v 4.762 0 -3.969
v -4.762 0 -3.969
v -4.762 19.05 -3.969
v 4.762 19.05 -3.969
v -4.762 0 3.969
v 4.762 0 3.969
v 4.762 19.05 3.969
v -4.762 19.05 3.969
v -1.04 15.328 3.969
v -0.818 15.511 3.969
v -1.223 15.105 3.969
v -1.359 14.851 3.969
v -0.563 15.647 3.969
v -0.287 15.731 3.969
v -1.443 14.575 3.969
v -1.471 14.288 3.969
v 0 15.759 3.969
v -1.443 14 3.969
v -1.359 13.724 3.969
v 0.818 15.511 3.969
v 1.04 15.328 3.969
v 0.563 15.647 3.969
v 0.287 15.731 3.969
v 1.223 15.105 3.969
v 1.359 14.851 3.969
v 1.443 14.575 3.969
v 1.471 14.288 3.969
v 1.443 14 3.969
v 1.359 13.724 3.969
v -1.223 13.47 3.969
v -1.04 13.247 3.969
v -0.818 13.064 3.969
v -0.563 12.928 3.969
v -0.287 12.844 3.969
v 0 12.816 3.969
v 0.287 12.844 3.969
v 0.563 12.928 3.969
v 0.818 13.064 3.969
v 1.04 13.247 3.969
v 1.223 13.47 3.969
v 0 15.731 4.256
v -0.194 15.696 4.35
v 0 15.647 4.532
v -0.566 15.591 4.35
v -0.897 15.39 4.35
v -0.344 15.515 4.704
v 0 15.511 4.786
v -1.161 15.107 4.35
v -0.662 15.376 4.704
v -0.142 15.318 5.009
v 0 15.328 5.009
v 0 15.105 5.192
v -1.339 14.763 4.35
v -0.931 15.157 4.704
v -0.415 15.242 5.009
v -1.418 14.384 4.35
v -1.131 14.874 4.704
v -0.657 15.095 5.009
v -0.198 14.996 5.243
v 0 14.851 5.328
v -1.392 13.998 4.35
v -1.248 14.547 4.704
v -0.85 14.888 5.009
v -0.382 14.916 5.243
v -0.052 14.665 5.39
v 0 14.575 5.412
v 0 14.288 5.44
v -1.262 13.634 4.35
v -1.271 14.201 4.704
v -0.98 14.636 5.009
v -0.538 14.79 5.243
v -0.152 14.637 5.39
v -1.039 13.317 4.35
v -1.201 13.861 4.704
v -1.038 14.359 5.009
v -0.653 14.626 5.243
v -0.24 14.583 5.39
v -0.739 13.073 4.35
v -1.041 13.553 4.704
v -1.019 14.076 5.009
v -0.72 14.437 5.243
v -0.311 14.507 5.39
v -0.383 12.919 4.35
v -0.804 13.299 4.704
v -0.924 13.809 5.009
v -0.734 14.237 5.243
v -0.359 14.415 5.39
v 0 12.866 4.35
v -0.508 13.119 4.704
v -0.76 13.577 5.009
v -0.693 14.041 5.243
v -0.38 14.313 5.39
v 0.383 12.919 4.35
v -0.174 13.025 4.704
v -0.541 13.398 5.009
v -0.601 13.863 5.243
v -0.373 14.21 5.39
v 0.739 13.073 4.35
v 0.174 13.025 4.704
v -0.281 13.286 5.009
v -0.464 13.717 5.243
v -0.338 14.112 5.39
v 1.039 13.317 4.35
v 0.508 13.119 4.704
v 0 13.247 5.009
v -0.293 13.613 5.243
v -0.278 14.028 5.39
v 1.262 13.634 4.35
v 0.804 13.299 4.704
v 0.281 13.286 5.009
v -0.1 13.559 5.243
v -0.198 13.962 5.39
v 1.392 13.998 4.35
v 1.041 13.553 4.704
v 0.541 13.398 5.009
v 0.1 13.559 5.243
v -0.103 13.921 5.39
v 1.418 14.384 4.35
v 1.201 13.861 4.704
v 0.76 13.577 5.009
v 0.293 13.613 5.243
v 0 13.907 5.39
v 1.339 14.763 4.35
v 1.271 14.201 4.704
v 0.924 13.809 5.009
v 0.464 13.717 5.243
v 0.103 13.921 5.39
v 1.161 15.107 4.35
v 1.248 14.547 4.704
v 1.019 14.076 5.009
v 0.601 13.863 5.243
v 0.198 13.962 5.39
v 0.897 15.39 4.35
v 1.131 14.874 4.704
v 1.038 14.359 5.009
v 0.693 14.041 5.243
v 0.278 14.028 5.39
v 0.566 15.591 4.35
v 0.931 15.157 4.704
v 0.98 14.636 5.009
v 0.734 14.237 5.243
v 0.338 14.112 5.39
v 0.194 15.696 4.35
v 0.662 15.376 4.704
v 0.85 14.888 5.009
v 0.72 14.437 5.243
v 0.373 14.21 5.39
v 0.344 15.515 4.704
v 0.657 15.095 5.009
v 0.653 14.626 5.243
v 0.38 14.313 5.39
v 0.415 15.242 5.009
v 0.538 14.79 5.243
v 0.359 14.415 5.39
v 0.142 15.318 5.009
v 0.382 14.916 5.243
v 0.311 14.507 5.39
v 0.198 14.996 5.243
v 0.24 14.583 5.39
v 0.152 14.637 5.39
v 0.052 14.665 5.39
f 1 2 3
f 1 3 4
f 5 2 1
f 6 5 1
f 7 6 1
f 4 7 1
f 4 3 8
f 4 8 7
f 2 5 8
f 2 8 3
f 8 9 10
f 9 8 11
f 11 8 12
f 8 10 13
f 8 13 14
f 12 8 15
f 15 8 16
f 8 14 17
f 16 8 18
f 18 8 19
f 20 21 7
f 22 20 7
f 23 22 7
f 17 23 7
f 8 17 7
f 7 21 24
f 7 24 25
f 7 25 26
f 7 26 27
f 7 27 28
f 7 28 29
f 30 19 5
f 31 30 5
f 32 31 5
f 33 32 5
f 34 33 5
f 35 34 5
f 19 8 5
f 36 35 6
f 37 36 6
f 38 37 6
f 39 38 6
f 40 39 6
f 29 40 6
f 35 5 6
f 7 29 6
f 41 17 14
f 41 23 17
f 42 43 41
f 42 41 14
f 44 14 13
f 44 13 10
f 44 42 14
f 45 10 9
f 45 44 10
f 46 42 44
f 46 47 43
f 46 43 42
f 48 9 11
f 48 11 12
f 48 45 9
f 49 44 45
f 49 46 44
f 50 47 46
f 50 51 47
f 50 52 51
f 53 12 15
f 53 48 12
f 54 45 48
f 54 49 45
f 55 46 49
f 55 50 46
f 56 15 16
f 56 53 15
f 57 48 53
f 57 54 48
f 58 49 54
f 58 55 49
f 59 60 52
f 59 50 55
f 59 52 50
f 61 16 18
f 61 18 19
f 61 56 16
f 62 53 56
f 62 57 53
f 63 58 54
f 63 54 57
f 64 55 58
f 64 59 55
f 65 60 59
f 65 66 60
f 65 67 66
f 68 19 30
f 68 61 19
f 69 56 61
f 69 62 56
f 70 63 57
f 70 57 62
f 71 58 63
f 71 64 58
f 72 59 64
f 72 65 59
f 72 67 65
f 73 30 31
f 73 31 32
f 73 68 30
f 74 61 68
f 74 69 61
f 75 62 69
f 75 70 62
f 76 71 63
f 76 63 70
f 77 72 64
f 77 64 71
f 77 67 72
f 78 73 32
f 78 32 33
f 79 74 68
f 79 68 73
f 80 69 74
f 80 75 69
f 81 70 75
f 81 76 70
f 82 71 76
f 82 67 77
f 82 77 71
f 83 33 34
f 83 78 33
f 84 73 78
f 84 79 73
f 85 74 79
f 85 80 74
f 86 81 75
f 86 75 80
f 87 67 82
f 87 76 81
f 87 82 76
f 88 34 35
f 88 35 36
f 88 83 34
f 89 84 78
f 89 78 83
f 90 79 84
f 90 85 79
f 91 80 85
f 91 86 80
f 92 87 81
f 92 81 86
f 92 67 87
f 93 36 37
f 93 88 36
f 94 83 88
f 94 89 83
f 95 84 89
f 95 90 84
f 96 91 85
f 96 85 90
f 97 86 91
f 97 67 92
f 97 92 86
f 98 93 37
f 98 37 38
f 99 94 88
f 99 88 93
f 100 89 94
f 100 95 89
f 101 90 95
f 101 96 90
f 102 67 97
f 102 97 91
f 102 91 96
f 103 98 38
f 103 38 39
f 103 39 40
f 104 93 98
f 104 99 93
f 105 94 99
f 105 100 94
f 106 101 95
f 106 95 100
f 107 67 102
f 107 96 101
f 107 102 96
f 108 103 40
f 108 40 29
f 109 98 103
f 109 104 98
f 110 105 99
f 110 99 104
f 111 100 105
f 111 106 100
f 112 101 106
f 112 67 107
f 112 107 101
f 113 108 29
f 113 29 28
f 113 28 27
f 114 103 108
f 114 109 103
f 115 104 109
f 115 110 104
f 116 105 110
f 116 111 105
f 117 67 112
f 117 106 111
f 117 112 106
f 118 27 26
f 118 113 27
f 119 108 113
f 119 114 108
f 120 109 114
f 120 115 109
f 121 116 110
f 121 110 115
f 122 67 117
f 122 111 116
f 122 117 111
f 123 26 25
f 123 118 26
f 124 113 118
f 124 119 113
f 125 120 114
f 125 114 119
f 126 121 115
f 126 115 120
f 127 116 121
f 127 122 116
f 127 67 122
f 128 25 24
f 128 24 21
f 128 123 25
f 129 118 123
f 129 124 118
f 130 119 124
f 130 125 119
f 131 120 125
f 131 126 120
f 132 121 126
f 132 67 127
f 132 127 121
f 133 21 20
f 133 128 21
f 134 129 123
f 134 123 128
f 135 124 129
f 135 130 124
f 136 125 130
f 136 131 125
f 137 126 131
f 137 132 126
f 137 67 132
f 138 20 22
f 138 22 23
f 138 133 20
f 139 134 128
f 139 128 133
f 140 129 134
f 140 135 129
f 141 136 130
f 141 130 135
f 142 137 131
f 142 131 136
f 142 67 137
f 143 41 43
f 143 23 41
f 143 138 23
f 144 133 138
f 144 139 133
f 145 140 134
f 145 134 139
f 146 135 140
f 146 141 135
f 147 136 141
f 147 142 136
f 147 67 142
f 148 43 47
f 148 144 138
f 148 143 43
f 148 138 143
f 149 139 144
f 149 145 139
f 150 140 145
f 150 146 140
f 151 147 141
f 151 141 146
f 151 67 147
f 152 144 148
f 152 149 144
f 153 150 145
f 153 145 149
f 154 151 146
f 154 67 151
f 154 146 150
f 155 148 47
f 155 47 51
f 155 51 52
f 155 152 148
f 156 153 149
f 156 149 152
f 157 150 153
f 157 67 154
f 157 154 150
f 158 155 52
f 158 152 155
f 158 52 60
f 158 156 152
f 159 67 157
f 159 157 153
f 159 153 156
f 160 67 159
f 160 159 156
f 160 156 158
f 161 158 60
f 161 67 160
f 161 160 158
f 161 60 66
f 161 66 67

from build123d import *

# Parameters (mm, degrees)
SKETCH1_W           = 9.525
SKETCH1_H           = 7.9375
BOSS_EXTRUDE1_DEPTH = 19.05


with BuildPart() as part:
    # Sketch1 → Boss-Extrude1 (new body)
    with BuildSketch(Plane(origin=(0, 0, 0), x_dir=(1, 0, 0), z_dir=(0, 1, 0))):
        Rectangle(SKETCH1_W, SKETCH1_H)
    extrude(amount=BOSS_EXTRUDE1_DEPTH)

    # Sketch3 → Revolve1 (revolve)
    with BuildSketch(Plane(origin=(0, 0, 0), x_dir=(0, 0, -1), z_dir=(1, 0, 0))):
        with BuildLine():
            Line((-3.96875, 14.2875), (-3.96875, 15.758974771))
            ThreePointArc((-3.96875, 15.758974771), (-5.009239789, 15.327989789), (-5.440224771, 14.2875))
            Line((-5.440224771, 14.2875), (-3.96875, 14.2875))
        make_face()
    revolve(axis=Axis((0, 14.2875, 3.96875), (0, 0, 1)))


solid = part.part
